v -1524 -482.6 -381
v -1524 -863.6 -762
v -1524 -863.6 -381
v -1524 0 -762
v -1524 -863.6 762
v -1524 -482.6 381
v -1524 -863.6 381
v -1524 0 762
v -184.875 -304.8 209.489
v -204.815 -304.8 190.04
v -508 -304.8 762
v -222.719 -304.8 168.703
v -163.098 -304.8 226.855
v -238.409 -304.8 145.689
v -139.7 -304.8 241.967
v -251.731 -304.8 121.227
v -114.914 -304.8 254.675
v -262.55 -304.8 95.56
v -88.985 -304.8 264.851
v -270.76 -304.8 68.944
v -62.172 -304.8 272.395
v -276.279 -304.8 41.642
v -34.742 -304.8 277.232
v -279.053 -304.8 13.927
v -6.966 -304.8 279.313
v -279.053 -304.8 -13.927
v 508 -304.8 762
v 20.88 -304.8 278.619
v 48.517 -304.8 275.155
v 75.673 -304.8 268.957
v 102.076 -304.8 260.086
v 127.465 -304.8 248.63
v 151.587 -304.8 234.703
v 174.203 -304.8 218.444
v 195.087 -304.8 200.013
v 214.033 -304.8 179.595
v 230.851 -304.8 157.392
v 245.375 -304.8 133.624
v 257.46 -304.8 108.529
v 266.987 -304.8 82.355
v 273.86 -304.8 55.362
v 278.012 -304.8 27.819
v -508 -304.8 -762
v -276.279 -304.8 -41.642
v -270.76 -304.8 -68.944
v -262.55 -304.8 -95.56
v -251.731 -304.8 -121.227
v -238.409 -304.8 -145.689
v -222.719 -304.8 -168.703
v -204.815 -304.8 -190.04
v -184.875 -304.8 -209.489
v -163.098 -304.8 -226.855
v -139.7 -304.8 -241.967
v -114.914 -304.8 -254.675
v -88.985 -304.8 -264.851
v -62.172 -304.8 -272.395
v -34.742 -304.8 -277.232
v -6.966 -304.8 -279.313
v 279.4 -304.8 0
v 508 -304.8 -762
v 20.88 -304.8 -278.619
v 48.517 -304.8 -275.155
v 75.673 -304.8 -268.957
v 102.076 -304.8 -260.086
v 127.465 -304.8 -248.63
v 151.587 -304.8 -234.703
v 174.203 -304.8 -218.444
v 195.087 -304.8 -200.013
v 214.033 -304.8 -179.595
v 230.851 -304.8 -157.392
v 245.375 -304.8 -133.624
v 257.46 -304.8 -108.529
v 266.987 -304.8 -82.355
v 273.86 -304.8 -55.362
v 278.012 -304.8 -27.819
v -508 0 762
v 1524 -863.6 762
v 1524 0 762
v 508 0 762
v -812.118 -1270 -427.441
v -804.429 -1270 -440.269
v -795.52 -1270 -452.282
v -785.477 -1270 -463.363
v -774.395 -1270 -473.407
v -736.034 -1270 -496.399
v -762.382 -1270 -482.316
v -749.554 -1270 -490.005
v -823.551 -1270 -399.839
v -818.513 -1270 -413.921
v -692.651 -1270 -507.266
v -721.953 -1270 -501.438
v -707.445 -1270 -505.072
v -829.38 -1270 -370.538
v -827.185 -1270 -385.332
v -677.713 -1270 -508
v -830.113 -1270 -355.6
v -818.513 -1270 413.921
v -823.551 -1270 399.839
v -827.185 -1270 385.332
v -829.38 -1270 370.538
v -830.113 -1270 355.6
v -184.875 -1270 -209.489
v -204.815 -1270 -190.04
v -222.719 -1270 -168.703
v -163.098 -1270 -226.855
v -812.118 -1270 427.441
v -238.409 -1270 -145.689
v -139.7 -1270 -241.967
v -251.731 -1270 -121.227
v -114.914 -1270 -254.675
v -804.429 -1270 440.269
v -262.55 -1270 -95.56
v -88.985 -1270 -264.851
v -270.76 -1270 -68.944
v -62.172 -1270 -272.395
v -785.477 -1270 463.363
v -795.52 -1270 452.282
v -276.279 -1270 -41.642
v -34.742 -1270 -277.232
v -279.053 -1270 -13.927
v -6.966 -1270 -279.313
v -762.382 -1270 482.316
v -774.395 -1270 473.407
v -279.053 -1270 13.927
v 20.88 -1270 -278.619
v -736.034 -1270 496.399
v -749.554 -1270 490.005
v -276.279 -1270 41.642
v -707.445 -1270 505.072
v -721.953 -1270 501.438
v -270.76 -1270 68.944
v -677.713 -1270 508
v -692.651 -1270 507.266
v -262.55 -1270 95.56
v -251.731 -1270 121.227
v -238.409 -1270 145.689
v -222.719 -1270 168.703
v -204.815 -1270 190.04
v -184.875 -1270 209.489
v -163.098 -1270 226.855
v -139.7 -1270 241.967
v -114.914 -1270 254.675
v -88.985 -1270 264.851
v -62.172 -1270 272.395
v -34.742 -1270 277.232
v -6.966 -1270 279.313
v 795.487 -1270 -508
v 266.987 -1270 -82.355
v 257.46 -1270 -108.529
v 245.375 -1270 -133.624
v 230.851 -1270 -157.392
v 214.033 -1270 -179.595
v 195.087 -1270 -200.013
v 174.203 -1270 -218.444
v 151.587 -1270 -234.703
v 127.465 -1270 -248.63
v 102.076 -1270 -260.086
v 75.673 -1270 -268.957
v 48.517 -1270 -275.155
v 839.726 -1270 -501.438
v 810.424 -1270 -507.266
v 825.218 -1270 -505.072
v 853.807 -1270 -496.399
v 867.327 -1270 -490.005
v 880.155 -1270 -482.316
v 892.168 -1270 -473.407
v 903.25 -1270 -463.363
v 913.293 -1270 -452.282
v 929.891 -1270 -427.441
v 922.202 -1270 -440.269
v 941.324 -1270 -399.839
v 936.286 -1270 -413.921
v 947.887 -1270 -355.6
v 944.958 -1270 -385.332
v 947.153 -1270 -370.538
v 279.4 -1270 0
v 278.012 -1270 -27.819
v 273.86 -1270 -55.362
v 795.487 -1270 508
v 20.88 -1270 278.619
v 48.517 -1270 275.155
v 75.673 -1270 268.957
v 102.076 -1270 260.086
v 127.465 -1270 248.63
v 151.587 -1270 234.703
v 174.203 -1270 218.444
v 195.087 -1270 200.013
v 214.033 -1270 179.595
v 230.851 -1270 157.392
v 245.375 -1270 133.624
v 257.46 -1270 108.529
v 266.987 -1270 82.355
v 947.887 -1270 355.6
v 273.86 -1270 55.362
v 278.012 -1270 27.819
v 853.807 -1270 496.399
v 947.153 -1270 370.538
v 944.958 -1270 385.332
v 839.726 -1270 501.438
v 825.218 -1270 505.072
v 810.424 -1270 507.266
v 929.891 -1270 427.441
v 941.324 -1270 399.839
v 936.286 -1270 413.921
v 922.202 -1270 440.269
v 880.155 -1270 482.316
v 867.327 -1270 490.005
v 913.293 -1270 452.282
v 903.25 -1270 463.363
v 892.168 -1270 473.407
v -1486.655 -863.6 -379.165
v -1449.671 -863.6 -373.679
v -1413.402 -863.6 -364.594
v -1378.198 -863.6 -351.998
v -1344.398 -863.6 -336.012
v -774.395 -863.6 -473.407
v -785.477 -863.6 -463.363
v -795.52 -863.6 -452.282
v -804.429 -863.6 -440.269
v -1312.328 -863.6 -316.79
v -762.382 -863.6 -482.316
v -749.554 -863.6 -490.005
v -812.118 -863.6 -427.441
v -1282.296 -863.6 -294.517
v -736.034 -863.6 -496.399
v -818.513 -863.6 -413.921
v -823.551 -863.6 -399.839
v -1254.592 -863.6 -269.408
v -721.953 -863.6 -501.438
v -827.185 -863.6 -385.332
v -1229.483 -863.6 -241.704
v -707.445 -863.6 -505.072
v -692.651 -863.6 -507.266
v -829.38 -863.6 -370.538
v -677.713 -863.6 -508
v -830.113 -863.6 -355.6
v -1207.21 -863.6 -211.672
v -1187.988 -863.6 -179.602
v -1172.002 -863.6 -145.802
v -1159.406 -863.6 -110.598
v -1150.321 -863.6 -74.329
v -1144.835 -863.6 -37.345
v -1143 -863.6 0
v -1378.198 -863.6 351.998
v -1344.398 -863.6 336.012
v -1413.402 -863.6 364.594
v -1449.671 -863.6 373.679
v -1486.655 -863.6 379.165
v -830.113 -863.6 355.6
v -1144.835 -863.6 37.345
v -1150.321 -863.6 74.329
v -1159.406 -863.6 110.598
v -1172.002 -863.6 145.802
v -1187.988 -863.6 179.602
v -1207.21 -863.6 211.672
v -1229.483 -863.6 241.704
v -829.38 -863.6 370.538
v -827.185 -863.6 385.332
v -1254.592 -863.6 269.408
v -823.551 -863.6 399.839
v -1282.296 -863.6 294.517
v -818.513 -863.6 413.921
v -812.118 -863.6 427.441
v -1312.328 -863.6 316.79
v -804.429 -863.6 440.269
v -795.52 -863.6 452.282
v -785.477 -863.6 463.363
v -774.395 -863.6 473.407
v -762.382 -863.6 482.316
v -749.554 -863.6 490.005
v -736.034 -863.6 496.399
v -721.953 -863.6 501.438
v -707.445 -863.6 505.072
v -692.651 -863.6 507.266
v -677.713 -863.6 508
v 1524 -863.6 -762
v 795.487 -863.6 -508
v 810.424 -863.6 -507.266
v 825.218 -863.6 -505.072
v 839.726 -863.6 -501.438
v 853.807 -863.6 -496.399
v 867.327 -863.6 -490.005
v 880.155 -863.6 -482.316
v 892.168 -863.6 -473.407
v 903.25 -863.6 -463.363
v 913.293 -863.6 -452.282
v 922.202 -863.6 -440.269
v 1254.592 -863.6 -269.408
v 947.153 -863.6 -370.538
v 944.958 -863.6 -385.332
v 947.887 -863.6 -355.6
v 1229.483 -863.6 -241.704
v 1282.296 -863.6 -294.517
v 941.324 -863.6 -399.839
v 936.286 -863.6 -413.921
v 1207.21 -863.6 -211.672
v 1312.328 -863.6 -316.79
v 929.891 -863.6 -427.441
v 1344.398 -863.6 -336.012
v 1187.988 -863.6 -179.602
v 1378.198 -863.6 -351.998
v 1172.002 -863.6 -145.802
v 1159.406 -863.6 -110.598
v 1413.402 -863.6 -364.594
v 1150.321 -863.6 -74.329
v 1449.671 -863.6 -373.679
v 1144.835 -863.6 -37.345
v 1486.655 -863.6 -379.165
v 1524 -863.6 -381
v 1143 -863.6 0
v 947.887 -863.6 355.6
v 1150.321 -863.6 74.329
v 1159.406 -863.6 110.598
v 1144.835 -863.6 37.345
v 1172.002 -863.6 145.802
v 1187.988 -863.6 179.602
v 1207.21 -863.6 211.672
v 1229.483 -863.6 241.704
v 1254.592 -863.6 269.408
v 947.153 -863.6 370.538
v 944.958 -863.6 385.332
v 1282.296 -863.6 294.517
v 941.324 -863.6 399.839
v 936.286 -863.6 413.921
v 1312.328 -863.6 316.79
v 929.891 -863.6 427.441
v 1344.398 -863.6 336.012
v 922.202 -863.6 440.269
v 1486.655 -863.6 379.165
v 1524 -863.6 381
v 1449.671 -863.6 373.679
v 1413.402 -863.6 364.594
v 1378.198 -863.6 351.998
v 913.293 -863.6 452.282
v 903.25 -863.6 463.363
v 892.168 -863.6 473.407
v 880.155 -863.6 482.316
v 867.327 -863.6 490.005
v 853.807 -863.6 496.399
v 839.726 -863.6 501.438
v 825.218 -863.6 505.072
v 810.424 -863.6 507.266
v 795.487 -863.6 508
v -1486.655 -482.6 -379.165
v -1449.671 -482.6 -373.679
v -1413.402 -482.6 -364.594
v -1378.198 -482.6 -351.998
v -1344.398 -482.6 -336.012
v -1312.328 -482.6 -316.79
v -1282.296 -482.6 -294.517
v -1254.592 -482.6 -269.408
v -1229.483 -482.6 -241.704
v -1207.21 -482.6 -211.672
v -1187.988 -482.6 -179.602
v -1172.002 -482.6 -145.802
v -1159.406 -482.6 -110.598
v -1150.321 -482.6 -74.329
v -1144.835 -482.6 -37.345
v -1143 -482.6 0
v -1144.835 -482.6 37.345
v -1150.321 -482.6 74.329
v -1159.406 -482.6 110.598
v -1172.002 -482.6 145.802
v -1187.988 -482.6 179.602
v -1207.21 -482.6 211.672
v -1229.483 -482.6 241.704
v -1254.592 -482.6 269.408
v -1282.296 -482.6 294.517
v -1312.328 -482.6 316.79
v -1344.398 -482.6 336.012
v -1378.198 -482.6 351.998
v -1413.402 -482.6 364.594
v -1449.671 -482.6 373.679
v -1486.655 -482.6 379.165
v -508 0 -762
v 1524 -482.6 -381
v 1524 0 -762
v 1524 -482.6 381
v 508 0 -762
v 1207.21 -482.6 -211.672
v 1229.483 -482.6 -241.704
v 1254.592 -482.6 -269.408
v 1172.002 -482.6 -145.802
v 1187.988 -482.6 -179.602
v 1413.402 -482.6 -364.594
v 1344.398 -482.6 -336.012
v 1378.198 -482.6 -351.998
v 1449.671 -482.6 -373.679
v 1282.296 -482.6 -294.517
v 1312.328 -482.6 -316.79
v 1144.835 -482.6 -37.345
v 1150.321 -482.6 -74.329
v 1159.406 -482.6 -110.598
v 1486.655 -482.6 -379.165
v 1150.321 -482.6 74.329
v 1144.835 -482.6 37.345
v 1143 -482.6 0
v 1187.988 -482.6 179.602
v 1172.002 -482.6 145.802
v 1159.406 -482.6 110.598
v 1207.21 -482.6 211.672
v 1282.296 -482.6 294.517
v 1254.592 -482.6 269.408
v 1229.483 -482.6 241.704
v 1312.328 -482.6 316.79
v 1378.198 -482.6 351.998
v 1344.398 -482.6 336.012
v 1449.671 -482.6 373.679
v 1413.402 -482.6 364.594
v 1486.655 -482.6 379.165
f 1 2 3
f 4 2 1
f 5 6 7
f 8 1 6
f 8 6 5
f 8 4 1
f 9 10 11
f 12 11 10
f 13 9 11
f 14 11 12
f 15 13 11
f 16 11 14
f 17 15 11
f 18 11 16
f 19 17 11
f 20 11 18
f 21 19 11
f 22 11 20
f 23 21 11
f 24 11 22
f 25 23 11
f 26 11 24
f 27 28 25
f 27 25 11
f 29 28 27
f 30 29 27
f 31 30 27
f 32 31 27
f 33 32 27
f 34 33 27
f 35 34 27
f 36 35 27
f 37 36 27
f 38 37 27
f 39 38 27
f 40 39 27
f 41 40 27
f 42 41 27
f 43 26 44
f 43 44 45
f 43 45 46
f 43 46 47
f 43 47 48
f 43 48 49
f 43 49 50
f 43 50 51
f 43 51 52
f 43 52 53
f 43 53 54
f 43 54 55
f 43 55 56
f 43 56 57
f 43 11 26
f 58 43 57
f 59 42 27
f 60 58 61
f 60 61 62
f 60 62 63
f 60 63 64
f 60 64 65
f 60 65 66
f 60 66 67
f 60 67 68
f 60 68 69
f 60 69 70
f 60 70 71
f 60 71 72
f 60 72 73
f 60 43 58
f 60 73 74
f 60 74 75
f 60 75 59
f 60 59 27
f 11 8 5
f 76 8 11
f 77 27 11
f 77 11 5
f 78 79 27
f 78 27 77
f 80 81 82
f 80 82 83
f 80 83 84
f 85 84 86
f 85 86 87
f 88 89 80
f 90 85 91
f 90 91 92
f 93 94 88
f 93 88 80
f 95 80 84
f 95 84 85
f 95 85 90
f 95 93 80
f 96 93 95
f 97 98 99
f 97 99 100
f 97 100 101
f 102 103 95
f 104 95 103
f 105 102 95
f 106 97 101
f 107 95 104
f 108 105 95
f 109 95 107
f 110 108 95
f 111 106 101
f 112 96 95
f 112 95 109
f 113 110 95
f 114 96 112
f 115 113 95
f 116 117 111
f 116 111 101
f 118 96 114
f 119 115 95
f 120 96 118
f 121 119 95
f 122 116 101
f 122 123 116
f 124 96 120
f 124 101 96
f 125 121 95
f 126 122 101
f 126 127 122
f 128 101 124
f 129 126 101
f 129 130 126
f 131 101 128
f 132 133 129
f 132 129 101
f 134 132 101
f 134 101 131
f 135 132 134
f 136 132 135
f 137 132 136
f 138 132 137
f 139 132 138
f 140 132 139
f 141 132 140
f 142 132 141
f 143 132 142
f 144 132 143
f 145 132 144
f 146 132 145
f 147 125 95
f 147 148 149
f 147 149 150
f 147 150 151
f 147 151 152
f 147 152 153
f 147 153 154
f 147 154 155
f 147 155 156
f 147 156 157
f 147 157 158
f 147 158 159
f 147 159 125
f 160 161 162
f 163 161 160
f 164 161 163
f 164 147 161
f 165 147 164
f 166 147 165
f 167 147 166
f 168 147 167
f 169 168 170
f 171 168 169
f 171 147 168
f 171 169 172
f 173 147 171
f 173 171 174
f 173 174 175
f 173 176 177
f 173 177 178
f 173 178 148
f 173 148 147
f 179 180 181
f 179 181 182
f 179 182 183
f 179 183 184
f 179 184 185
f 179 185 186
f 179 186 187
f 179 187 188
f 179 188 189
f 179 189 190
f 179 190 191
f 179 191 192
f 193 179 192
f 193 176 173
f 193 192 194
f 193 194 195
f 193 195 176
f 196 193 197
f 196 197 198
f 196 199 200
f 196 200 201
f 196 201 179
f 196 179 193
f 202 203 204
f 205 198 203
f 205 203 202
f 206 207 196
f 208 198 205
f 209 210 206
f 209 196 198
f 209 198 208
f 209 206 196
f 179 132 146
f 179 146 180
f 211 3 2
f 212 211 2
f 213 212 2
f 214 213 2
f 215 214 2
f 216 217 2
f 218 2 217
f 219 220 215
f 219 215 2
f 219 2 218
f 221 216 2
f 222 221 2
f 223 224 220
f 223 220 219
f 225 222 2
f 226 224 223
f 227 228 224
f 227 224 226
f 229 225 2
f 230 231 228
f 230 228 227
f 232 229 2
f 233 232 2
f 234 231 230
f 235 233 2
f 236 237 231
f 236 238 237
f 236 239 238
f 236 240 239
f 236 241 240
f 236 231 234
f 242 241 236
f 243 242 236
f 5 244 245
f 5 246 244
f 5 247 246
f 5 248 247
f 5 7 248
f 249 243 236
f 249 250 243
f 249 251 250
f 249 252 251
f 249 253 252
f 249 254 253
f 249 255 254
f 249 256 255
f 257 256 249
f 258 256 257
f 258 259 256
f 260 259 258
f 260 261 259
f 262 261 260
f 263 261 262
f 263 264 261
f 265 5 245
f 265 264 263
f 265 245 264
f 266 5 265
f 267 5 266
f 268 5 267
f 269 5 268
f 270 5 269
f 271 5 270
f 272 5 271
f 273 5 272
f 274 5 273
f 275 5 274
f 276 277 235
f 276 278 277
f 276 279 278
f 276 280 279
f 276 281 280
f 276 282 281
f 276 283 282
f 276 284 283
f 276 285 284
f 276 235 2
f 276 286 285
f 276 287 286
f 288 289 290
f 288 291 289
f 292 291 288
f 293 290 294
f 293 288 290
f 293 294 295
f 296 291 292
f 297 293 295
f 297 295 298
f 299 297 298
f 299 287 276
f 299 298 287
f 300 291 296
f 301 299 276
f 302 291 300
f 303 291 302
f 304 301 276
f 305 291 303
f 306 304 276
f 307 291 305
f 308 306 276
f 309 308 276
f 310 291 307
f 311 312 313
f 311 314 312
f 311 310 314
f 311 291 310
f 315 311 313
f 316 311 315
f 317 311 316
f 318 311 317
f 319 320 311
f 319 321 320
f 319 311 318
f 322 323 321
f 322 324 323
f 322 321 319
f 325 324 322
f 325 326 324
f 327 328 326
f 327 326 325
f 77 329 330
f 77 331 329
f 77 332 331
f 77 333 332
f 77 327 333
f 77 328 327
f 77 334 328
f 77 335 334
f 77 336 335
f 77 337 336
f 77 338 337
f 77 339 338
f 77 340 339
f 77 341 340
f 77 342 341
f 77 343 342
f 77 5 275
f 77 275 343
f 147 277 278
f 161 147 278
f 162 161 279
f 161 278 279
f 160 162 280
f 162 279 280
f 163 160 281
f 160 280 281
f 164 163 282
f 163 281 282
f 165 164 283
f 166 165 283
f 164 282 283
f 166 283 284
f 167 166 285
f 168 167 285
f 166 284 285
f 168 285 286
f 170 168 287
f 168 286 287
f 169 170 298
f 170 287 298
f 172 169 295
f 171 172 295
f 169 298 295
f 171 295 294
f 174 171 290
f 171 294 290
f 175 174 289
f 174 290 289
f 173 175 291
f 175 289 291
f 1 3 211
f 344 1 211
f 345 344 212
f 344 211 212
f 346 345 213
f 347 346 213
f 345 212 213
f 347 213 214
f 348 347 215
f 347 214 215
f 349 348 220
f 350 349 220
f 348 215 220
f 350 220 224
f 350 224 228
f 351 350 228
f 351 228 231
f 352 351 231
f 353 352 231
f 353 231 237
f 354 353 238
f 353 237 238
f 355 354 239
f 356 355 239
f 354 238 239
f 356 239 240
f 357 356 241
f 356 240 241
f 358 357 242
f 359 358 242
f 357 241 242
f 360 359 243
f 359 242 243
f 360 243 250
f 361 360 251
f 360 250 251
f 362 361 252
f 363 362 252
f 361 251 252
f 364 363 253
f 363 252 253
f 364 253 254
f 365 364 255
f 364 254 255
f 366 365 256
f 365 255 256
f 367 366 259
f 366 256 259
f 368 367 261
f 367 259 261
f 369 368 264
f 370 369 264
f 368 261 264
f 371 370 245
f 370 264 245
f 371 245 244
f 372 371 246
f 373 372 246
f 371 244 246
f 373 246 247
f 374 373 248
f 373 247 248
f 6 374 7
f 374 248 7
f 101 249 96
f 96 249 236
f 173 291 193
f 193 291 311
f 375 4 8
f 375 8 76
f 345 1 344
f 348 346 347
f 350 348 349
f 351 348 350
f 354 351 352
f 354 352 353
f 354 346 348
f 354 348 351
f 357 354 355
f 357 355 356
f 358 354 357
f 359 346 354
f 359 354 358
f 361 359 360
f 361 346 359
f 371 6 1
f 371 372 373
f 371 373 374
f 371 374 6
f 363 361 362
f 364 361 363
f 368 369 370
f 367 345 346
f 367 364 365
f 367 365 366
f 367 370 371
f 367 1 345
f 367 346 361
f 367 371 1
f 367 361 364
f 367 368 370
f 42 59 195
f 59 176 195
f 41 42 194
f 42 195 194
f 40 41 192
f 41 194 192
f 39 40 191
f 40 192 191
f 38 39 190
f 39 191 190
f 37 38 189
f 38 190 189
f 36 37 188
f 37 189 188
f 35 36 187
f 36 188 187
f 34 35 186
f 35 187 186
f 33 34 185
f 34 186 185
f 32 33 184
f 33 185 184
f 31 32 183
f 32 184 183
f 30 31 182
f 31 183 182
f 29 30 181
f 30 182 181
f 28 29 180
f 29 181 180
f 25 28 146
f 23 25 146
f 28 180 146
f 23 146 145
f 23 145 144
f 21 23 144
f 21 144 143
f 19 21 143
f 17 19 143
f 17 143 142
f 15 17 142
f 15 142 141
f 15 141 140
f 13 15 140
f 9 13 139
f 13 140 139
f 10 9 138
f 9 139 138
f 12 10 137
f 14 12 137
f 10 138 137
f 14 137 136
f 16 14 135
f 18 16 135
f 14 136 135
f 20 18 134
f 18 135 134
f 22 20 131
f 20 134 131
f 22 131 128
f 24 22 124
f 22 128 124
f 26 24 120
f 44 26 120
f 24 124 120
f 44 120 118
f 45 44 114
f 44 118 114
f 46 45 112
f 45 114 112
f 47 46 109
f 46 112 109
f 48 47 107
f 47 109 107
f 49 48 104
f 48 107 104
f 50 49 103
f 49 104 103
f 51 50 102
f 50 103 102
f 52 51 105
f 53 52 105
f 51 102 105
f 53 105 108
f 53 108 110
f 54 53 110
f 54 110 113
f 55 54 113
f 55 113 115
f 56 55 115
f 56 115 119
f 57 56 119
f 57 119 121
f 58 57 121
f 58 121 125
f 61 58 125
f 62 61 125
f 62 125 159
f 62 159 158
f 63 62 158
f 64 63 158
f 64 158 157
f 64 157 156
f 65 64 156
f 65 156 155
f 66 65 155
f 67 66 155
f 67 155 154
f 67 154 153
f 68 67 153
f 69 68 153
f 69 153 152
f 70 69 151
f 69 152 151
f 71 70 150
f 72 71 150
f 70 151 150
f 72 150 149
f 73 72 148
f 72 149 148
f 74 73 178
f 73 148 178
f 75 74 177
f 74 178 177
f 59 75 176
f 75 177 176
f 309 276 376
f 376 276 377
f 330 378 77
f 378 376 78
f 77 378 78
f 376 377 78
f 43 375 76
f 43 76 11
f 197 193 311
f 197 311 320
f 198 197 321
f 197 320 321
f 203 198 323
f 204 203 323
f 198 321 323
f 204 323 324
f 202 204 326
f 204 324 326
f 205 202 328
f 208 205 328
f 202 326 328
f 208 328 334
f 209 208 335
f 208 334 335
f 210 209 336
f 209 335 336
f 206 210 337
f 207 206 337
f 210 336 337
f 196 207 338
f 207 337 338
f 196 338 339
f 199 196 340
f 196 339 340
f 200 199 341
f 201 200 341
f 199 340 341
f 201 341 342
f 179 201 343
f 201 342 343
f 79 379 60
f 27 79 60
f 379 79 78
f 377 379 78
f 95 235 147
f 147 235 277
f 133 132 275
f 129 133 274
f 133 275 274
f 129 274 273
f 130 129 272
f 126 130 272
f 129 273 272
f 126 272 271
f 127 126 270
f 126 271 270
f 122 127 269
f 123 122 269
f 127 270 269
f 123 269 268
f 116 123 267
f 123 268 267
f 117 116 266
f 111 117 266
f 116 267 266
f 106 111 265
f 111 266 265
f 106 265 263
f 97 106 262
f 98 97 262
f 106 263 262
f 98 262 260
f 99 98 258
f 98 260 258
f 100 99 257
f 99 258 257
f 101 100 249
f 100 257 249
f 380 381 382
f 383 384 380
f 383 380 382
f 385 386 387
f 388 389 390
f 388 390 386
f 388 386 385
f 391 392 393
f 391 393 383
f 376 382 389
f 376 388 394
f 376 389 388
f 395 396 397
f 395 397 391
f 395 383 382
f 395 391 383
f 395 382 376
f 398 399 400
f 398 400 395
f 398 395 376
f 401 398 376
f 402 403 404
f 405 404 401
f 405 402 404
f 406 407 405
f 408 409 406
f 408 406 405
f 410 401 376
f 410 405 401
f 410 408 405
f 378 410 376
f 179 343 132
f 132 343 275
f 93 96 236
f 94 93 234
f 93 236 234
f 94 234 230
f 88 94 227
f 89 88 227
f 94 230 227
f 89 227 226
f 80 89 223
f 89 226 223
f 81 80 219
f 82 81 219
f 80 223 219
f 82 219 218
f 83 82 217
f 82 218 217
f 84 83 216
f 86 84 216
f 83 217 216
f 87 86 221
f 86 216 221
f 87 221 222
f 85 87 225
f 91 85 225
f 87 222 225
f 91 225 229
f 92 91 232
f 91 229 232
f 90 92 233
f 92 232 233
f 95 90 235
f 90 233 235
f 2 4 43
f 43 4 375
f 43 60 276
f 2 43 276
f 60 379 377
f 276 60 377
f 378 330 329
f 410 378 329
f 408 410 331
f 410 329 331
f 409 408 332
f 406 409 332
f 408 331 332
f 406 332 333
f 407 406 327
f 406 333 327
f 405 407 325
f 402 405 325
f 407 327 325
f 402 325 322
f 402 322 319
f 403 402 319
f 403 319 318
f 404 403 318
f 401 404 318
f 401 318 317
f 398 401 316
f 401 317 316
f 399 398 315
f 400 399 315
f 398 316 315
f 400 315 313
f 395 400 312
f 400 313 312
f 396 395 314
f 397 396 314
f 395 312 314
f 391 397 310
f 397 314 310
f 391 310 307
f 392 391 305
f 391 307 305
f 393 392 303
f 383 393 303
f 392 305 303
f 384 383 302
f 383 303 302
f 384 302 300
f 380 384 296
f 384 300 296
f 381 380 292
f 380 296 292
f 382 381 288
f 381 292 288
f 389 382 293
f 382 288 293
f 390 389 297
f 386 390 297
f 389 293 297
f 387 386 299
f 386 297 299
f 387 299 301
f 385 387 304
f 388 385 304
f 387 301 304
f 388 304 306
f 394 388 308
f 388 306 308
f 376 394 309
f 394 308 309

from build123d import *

# Parameters (mm, degrees)
F0_W      = 3048
F0_H      = 1524
F1_DEPTH  = 863.6
F3_DEPTH  = 381
F4_W      = 1016
F4_H      = 304.8
F5_DEPTH  = 1524.001
F7_DEPTH  = 406.4
F8_R      = 279.4
F9_DEPTH  = 406.401
F9_FACE_R = 279.4
F10_DEPTH = 863.601


with BuildPart() as f1:
    # F0 (on Front) → F1 (new body)
    with BuildSketch(Plane.XZ):
        Rectangle(F0_W, F0_H)
    extrude(amount=F1_DEPTH)

    # F2 (on face) → F3 (cut)
    with BuildSketch(Plane.XZ.offset(863.6)):
        with BuildLine():
            Line((-1524, 381), (-1524, -381))
            ThreePointArc((-1524, -381), (-1143, 0), (-1524, 381))
        make_face()
        with BuildLine():
            ThreePointArc((1524, 381), (1143, 0), (1524, -381))
            Line((1524, -381), (1524, 381))
        make_face()
    extrude(amount=-F3_DEPTH, mode=Mode.SUBTRACT)

    # F4 (on face) → F5 (cut, through all)
    with BuildSketch(Plane(origin=(0, 0, -762), x_dir=(1, 0, 0), z_dir=(0, 0, -1))):
        with Locations((0, 152.4)):
            Rectangle(F4_W, F4_H)
    extrude(amount=-F5_DEPTH, mode=Mode.SUBTRACT)

    # F6 (on face) → F7 (join)
    with BuildSketch(Plane.XZ.offset(863.6)):
        with BuildLine():
            ThreePointArc((947.886524, 355.6), (903.249597, 463.363073), (795.486524, 508))
            Line((795.486524, 508), (-677.713476, 508))
            ThreePointArc((-677.713476, 508), (-785.47655, 463.363073), (-830.113476, 355.6))
            Line((-830.113476, 355.6), (-830.113476, -355.6))
            ThreePointArc((-830.113476, -355.6), (-785.47655, -463.363073), (-677.713476, -508))
            Line((-677.713476, -508), (795.486524, -508))
            ThreePointArc((795.486524, -508), (903.249597, -463.363073), (947.886524, -355.6))
            Line((947.886524, -355.6), (947.886524, 355.6))
        make_face()
    extrude(amount=F7_DEPTH)

    # F8 (on face) → F9 (cut, through all)
    with BuildSketch(Plane.XZ.offset(863.6)):
        Circle(F8_R)
    extrude(amount=F9_DEPTH, mode=Mode.SUBTRACT)

    # F9_face (on face) → F10 (cut, through all)
    with BuildSketch(Plane.XZ.offset(863.6)):
        Circle(F9_FACE_R)
    extrude(amount=-F10_DEPTH, mode=Mode.SUBTRACT)


solid = f1.part
